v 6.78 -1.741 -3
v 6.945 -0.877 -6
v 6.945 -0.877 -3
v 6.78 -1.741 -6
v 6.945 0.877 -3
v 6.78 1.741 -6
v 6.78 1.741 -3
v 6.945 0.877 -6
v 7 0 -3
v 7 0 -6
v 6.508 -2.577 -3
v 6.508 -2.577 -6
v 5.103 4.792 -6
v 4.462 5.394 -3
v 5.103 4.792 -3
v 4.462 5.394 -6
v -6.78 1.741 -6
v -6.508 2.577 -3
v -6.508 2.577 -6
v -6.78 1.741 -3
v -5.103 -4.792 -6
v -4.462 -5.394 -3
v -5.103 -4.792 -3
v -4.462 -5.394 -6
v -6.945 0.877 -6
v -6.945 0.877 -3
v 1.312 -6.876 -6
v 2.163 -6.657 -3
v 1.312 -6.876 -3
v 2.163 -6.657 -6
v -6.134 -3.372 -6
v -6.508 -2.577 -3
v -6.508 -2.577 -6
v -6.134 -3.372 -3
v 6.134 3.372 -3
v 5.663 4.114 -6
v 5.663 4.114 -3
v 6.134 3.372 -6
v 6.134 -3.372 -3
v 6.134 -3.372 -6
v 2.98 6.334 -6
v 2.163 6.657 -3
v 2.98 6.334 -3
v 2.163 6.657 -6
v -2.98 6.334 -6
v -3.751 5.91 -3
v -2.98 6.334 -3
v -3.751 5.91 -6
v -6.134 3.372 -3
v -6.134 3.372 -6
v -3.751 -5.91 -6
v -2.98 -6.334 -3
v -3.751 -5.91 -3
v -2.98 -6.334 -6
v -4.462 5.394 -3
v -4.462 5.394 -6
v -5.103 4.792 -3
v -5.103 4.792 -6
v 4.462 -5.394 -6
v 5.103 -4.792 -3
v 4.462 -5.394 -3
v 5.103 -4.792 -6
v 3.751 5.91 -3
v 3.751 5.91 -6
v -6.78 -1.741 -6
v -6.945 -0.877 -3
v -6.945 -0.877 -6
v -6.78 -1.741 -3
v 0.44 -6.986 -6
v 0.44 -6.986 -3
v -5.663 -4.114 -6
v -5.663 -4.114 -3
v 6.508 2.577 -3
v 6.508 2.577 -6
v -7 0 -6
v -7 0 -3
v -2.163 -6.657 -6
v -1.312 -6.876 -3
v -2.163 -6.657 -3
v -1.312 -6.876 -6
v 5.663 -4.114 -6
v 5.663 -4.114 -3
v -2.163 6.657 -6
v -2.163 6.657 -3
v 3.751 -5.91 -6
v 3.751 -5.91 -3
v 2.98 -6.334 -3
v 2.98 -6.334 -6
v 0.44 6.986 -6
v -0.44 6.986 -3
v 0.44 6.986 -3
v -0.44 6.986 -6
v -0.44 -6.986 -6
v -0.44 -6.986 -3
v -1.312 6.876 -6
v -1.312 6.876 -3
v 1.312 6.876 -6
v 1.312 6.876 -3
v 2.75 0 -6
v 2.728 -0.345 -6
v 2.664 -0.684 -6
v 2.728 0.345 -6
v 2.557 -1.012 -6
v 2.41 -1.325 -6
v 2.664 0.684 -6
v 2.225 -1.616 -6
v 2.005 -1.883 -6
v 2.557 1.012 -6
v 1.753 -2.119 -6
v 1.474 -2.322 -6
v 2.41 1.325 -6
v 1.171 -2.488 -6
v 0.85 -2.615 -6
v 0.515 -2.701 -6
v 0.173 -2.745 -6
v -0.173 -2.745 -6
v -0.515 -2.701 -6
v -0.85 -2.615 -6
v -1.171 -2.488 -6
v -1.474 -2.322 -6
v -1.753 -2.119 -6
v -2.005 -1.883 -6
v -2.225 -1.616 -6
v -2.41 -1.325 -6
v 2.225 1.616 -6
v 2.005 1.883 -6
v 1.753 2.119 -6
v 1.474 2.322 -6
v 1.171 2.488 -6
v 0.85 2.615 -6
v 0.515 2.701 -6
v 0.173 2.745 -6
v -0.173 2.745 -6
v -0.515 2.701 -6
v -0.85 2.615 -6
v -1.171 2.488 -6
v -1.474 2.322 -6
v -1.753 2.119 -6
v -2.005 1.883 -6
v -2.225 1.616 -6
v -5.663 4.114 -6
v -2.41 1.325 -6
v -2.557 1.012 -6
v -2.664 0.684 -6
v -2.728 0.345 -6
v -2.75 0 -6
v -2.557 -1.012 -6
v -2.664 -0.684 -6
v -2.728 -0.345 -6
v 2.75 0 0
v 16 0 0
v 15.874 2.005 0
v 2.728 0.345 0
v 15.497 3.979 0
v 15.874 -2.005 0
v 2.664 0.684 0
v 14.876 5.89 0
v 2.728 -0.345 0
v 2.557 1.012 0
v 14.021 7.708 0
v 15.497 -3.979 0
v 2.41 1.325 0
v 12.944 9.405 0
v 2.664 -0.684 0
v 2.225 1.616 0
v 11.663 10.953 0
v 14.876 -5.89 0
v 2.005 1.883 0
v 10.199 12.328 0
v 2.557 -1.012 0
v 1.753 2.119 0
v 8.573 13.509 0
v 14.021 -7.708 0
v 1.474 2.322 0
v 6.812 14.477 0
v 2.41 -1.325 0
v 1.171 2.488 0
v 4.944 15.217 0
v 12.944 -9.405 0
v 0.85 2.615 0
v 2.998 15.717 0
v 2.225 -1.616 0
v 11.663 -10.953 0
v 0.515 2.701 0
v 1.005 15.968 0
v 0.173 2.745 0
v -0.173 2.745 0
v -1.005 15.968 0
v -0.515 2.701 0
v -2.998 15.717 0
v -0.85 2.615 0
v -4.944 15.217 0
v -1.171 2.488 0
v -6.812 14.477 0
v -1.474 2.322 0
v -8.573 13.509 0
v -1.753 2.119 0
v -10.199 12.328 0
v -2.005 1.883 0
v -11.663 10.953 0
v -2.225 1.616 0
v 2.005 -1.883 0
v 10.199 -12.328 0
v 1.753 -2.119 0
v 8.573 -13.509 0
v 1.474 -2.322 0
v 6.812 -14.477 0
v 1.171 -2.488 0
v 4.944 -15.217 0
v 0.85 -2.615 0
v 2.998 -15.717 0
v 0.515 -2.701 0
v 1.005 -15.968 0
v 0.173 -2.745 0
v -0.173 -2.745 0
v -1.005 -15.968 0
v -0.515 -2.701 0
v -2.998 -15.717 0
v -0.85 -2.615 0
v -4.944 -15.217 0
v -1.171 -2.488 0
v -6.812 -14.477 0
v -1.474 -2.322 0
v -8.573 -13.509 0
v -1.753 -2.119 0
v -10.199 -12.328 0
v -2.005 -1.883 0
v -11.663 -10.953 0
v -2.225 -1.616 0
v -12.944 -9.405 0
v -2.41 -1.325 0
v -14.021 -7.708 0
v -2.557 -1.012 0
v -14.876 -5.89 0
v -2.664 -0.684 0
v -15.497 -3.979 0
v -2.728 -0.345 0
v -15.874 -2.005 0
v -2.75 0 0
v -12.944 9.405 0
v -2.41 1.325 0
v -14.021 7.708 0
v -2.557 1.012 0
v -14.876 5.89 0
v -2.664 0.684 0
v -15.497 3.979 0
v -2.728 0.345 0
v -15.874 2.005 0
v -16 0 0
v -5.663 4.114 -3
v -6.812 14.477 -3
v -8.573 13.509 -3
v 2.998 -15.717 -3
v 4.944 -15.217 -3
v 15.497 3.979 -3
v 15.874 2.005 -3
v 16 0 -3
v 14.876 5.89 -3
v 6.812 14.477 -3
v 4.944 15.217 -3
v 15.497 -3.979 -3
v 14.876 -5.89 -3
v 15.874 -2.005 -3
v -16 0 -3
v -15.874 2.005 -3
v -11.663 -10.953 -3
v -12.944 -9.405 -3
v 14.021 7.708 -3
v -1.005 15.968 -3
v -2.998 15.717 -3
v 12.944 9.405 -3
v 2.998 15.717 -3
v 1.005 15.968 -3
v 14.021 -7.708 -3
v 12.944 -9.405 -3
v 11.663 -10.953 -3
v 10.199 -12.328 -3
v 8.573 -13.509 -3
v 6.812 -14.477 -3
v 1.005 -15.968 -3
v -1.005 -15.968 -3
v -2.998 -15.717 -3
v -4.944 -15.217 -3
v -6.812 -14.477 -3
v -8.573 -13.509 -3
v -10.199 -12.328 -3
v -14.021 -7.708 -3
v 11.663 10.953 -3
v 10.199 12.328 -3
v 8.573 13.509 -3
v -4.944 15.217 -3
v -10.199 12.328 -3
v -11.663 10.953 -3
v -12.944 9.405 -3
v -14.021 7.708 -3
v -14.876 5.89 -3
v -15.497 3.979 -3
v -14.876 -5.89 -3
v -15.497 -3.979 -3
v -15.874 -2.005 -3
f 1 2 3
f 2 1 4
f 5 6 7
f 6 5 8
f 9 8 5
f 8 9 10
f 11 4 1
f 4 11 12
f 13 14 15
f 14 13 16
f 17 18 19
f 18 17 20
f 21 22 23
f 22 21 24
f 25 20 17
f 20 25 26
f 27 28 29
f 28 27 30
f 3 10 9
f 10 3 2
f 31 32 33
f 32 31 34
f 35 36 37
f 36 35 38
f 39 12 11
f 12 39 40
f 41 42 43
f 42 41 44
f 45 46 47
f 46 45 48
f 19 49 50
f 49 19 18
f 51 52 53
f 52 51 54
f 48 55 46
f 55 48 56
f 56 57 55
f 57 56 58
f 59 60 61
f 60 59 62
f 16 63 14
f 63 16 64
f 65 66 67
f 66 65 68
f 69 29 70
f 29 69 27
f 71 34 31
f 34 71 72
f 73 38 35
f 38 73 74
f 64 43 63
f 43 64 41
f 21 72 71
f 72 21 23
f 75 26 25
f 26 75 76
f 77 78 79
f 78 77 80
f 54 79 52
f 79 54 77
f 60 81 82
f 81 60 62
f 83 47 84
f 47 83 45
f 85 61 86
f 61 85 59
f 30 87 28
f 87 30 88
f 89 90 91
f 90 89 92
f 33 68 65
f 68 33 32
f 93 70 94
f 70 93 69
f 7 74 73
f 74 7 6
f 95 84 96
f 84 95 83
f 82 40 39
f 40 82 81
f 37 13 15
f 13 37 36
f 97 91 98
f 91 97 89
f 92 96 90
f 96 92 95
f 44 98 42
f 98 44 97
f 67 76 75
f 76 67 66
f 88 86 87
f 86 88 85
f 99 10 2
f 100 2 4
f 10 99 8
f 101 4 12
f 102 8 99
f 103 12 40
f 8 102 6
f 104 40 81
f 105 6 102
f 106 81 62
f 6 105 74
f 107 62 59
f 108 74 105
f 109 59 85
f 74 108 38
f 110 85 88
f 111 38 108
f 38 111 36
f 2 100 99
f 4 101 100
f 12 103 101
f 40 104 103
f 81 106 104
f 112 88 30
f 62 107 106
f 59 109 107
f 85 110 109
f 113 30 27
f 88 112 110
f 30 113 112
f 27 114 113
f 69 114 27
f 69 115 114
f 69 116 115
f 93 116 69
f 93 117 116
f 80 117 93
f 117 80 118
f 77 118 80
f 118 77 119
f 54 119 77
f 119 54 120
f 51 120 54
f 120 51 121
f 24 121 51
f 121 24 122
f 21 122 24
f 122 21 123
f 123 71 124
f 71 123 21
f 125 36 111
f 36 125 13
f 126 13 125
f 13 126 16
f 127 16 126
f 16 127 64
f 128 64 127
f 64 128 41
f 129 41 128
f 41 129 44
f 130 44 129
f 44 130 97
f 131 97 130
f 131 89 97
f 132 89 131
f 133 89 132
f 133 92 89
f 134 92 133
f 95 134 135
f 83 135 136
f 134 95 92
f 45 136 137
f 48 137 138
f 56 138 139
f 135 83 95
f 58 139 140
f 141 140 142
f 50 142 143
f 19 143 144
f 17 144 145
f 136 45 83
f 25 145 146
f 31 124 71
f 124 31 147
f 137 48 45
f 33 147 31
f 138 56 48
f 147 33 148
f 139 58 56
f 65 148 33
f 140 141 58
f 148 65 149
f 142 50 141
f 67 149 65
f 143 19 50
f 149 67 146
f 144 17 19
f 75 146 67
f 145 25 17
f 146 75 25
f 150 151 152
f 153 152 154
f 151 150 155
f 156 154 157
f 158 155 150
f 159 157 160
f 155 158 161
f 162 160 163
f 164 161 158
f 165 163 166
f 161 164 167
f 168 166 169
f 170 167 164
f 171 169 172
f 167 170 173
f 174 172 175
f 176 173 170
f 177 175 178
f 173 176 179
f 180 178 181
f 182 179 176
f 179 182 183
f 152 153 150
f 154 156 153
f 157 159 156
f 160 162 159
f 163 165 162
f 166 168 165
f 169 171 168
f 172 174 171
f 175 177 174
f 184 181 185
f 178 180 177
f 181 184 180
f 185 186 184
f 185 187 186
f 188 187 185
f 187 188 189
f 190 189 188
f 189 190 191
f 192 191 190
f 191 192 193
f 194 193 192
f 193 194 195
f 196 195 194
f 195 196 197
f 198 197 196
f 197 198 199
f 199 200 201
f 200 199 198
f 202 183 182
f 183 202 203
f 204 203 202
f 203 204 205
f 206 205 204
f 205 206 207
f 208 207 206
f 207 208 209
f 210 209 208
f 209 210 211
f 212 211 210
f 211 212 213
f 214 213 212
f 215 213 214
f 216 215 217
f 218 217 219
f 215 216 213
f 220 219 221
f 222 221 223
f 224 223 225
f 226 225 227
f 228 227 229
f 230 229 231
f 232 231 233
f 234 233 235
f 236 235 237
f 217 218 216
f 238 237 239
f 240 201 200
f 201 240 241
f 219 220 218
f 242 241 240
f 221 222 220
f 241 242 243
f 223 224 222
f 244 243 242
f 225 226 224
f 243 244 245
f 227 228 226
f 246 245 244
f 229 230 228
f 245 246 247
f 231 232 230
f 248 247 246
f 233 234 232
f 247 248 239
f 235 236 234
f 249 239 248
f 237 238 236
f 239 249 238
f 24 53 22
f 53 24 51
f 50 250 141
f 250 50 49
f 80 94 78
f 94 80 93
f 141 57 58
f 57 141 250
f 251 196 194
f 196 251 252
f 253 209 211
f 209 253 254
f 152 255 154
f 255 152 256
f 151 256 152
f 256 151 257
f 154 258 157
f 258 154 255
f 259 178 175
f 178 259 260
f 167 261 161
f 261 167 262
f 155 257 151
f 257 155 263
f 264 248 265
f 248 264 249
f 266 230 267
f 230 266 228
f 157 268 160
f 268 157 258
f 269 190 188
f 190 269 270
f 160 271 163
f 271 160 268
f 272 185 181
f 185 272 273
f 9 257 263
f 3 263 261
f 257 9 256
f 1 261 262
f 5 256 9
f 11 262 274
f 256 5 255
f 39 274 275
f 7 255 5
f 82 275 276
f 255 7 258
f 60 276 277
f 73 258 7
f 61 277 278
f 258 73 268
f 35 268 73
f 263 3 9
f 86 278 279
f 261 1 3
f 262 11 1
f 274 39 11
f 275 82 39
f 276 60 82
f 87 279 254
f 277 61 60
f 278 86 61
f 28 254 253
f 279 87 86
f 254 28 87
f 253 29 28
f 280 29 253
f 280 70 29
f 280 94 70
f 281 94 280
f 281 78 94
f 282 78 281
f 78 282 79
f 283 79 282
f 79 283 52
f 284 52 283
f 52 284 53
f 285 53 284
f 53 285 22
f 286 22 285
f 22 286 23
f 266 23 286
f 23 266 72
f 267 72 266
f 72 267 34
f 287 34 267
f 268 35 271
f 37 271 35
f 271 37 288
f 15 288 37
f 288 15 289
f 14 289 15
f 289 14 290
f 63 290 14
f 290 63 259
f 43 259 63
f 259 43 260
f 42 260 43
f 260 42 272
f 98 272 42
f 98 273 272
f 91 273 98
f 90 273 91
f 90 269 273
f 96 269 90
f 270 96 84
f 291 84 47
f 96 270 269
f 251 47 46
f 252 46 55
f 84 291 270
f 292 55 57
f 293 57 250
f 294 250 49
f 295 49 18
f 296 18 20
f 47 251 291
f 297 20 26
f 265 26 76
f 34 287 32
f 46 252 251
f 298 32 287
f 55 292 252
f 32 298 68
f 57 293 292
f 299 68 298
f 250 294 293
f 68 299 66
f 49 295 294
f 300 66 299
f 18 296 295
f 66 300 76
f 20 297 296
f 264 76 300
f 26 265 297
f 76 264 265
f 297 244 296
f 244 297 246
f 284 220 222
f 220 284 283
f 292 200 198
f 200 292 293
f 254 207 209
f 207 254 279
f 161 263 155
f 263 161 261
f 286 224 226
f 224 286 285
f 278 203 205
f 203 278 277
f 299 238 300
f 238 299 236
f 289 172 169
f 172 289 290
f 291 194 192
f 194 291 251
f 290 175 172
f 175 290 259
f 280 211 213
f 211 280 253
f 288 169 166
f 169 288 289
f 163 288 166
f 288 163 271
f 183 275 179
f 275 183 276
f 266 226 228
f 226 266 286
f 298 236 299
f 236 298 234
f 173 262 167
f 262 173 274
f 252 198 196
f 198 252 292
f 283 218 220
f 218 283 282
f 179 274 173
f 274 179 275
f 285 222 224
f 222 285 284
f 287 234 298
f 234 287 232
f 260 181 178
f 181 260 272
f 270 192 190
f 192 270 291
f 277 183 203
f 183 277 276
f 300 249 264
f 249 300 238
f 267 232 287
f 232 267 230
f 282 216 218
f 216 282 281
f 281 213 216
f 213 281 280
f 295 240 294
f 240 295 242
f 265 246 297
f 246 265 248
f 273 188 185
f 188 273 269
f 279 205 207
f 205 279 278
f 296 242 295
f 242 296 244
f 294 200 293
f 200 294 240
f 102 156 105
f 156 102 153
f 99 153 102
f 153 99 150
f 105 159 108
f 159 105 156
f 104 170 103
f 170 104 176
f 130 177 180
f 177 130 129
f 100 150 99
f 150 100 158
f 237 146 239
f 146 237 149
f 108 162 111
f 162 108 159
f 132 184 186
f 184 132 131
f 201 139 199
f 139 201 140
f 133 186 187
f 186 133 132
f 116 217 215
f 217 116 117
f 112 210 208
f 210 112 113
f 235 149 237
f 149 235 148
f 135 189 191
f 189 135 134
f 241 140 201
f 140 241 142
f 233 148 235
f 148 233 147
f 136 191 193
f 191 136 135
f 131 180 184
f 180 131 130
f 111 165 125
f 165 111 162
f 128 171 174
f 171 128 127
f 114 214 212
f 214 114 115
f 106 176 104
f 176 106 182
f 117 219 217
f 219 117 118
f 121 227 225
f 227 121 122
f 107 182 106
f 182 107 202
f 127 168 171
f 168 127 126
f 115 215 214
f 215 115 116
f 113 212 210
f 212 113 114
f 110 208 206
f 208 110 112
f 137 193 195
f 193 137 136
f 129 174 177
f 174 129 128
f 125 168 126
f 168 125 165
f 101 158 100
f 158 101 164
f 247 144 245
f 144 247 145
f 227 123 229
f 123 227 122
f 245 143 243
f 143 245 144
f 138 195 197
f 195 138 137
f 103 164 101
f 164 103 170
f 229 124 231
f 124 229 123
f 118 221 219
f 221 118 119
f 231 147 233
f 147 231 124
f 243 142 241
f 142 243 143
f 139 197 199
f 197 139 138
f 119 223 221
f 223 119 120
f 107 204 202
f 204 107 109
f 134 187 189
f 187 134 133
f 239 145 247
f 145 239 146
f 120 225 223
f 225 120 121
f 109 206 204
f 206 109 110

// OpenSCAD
$fn = 50;


difference() {
	union() {
		translate(v = [0, 0, -6.0000000000]) {
			cylinder(h = 6, r = 7.0000000000);
		}
		translate(v = [0, 0, -3.0000000000]) {
			cylinder(h = 3, r = 16.0000000000);
		}
	}
	union() {
		#translate(v = [0, 0, -6]) {
			cylinder(h = 6, r = 2.7500000000);
		}
	}
}
